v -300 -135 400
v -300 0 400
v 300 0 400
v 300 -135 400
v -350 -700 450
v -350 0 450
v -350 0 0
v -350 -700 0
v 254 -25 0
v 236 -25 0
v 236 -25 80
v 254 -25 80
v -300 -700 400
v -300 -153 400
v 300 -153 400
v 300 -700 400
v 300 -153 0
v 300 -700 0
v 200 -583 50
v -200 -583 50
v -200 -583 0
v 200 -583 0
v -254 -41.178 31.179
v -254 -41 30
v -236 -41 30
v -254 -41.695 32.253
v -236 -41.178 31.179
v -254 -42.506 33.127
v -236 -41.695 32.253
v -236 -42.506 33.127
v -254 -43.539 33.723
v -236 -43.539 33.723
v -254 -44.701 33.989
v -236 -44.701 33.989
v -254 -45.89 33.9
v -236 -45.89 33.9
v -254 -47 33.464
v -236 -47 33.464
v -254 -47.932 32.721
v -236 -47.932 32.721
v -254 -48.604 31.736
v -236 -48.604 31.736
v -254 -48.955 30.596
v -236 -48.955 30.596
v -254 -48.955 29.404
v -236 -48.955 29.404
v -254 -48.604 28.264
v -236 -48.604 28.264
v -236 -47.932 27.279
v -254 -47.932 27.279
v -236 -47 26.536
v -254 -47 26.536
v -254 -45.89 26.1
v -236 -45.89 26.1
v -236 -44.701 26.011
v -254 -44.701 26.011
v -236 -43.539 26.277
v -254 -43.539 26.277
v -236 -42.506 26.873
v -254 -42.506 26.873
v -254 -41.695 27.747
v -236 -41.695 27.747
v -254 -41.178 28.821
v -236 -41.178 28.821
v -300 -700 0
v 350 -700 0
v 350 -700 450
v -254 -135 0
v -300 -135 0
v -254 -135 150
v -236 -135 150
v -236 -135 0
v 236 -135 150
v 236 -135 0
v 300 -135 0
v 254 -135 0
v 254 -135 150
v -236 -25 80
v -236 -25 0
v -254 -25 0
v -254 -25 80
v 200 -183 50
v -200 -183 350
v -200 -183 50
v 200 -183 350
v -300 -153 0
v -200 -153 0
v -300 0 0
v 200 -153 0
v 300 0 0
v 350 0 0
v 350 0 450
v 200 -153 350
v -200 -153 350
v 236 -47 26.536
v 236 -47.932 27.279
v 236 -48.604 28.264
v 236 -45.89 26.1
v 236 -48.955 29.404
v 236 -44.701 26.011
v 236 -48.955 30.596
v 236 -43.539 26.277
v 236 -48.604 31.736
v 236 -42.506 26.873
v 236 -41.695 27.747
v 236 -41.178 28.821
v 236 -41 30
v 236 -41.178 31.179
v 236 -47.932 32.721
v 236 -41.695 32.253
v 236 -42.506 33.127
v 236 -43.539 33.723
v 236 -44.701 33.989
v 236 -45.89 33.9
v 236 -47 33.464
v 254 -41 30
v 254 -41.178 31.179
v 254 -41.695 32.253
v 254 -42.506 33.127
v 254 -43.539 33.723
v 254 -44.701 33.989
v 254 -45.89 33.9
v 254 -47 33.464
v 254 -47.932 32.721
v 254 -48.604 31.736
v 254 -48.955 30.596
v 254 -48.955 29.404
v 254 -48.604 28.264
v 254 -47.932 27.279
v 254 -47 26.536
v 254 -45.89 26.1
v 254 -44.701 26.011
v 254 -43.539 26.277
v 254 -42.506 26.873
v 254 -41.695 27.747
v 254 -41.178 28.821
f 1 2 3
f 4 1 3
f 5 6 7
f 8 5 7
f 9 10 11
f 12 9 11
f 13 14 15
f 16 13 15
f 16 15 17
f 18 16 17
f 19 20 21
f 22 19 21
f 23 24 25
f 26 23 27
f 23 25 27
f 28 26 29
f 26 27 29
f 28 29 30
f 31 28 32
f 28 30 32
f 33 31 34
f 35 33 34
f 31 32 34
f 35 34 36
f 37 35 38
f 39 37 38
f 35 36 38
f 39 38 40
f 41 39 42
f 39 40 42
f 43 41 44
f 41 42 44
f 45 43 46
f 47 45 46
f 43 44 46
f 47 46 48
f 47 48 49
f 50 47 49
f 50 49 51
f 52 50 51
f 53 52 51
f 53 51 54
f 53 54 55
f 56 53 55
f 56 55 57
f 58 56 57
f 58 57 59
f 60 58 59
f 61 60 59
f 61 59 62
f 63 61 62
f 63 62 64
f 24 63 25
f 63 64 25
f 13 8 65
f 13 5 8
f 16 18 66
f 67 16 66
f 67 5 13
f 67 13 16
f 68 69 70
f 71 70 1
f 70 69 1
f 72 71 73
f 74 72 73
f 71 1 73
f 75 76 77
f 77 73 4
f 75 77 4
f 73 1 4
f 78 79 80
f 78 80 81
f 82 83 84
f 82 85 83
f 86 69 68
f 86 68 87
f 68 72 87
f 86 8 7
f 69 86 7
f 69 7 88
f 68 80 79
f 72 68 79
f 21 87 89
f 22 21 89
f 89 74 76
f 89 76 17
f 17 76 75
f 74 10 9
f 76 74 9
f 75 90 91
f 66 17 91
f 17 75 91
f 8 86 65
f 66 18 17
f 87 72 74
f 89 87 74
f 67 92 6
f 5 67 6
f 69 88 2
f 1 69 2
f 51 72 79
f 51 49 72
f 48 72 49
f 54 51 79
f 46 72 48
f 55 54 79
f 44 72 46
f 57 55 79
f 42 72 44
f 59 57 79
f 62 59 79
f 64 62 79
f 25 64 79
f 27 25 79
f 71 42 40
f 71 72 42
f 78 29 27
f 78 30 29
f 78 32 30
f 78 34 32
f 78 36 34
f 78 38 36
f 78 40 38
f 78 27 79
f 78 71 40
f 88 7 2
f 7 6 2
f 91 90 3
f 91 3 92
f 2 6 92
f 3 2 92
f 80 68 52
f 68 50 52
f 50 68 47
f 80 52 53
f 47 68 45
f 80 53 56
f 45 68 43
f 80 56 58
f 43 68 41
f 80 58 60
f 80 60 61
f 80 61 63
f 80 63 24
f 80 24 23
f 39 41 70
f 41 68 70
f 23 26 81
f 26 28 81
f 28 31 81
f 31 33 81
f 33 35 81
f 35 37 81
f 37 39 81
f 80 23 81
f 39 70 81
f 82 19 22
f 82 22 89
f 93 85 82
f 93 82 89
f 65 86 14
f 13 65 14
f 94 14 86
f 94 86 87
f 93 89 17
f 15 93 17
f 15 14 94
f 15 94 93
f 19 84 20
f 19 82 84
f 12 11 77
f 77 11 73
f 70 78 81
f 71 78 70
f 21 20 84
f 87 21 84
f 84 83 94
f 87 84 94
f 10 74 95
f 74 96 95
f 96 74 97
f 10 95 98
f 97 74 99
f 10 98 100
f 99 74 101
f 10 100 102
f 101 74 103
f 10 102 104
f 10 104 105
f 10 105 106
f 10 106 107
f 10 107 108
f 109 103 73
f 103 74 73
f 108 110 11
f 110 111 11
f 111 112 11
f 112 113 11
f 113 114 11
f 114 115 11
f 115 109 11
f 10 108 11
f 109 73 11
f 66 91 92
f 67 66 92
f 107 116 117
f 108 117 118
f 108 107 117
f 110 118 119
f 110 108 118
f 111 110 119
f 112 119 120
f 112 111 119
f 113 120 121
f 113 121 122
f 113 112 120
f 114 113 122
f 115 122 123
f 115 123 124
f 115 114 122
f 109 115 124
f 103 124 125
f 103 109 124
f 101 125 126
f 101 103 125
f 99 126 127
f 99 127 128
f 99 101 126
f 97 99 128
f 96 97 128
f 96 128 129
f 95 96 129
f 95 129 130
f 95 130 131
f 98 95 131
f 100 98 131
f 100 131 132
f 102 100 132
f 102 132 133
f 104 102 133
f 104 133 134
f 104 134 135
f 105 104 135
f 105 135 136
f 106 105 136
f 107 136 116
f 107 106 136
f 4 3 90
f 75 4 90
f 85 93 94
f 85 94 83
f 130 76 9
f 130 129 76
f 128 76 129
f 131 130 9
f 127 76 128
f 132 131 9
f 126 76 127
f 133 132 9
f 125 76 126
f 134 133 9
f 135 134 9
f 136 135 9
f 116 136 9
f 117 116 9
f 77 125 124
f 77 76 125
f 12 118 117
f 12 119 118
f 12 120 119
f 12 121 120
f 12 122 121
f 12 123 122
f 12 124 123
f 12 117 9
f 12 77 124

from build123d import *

# Parameters (mm, degrees)
F1_DEPTH = 700
F2_W     = 600
F2_H     = 18
F3_DEPTH = 400
F6_START = 236
F5_R     = 4
F6_DEPTH = 18
F8_DEPTH = 200


# Not quite as in the source:
# - a pattern or mirror of a feature is missing from the dataset's text; its kind, count and spacing are read off the source's solid


with BuildPart() as f1:
    # F0 (on Front) → F1 (new body)
    with BuildSketch(Plane.XZ):
        Polygon((-350, 0), (-300, 0), (-300, 400), (300, 400), (300, 0), (350, 0), (350, 450), (-350, 450), align=None)
    extrude(amount=F1_DEPTH)

    # F2 (on face) → F3 (join)
    with BuildSketch(Plane(origin=(0, 0, 400), x_dir=(1, 0, 0), z_dir=(0, 0, -1))):
        with Locations((0, 144)):
            Rectangle(F2_W, F2_H)
    extrude(amount=F3_DEPTH)

    # F5 (on Right) → F6 (join)
    with BuildSketch(Plane.YZ.offset(F6_START)):
        Polygon((-135, 150), (-135, 0), (-25, 0), (-25, 80), align=None)
        with Locations((-45, 30)):
            Circle(F5_R, mode=Mode.SUBTRACT)
    f6 = extrude(amount=F6_DEPTH)

    # F6_copies: F6 across plane
    add(f6.mirror(Plane(origin=(0, 0, 0), x_dir=(0, 0, -1), z_dir=(-1, 0, 0))))

    # F7 (on Right) → F8 (join, symmetric)
    with BuildSketch(Plane.YZ):
        Polygon((-583, 50), (-583, 0), (-153, 0), (-153, 350), (-183, 350), (-183, 50), align=None)
    extrude(amount=F8_DEPTH, both=True)


solid = f1.part
